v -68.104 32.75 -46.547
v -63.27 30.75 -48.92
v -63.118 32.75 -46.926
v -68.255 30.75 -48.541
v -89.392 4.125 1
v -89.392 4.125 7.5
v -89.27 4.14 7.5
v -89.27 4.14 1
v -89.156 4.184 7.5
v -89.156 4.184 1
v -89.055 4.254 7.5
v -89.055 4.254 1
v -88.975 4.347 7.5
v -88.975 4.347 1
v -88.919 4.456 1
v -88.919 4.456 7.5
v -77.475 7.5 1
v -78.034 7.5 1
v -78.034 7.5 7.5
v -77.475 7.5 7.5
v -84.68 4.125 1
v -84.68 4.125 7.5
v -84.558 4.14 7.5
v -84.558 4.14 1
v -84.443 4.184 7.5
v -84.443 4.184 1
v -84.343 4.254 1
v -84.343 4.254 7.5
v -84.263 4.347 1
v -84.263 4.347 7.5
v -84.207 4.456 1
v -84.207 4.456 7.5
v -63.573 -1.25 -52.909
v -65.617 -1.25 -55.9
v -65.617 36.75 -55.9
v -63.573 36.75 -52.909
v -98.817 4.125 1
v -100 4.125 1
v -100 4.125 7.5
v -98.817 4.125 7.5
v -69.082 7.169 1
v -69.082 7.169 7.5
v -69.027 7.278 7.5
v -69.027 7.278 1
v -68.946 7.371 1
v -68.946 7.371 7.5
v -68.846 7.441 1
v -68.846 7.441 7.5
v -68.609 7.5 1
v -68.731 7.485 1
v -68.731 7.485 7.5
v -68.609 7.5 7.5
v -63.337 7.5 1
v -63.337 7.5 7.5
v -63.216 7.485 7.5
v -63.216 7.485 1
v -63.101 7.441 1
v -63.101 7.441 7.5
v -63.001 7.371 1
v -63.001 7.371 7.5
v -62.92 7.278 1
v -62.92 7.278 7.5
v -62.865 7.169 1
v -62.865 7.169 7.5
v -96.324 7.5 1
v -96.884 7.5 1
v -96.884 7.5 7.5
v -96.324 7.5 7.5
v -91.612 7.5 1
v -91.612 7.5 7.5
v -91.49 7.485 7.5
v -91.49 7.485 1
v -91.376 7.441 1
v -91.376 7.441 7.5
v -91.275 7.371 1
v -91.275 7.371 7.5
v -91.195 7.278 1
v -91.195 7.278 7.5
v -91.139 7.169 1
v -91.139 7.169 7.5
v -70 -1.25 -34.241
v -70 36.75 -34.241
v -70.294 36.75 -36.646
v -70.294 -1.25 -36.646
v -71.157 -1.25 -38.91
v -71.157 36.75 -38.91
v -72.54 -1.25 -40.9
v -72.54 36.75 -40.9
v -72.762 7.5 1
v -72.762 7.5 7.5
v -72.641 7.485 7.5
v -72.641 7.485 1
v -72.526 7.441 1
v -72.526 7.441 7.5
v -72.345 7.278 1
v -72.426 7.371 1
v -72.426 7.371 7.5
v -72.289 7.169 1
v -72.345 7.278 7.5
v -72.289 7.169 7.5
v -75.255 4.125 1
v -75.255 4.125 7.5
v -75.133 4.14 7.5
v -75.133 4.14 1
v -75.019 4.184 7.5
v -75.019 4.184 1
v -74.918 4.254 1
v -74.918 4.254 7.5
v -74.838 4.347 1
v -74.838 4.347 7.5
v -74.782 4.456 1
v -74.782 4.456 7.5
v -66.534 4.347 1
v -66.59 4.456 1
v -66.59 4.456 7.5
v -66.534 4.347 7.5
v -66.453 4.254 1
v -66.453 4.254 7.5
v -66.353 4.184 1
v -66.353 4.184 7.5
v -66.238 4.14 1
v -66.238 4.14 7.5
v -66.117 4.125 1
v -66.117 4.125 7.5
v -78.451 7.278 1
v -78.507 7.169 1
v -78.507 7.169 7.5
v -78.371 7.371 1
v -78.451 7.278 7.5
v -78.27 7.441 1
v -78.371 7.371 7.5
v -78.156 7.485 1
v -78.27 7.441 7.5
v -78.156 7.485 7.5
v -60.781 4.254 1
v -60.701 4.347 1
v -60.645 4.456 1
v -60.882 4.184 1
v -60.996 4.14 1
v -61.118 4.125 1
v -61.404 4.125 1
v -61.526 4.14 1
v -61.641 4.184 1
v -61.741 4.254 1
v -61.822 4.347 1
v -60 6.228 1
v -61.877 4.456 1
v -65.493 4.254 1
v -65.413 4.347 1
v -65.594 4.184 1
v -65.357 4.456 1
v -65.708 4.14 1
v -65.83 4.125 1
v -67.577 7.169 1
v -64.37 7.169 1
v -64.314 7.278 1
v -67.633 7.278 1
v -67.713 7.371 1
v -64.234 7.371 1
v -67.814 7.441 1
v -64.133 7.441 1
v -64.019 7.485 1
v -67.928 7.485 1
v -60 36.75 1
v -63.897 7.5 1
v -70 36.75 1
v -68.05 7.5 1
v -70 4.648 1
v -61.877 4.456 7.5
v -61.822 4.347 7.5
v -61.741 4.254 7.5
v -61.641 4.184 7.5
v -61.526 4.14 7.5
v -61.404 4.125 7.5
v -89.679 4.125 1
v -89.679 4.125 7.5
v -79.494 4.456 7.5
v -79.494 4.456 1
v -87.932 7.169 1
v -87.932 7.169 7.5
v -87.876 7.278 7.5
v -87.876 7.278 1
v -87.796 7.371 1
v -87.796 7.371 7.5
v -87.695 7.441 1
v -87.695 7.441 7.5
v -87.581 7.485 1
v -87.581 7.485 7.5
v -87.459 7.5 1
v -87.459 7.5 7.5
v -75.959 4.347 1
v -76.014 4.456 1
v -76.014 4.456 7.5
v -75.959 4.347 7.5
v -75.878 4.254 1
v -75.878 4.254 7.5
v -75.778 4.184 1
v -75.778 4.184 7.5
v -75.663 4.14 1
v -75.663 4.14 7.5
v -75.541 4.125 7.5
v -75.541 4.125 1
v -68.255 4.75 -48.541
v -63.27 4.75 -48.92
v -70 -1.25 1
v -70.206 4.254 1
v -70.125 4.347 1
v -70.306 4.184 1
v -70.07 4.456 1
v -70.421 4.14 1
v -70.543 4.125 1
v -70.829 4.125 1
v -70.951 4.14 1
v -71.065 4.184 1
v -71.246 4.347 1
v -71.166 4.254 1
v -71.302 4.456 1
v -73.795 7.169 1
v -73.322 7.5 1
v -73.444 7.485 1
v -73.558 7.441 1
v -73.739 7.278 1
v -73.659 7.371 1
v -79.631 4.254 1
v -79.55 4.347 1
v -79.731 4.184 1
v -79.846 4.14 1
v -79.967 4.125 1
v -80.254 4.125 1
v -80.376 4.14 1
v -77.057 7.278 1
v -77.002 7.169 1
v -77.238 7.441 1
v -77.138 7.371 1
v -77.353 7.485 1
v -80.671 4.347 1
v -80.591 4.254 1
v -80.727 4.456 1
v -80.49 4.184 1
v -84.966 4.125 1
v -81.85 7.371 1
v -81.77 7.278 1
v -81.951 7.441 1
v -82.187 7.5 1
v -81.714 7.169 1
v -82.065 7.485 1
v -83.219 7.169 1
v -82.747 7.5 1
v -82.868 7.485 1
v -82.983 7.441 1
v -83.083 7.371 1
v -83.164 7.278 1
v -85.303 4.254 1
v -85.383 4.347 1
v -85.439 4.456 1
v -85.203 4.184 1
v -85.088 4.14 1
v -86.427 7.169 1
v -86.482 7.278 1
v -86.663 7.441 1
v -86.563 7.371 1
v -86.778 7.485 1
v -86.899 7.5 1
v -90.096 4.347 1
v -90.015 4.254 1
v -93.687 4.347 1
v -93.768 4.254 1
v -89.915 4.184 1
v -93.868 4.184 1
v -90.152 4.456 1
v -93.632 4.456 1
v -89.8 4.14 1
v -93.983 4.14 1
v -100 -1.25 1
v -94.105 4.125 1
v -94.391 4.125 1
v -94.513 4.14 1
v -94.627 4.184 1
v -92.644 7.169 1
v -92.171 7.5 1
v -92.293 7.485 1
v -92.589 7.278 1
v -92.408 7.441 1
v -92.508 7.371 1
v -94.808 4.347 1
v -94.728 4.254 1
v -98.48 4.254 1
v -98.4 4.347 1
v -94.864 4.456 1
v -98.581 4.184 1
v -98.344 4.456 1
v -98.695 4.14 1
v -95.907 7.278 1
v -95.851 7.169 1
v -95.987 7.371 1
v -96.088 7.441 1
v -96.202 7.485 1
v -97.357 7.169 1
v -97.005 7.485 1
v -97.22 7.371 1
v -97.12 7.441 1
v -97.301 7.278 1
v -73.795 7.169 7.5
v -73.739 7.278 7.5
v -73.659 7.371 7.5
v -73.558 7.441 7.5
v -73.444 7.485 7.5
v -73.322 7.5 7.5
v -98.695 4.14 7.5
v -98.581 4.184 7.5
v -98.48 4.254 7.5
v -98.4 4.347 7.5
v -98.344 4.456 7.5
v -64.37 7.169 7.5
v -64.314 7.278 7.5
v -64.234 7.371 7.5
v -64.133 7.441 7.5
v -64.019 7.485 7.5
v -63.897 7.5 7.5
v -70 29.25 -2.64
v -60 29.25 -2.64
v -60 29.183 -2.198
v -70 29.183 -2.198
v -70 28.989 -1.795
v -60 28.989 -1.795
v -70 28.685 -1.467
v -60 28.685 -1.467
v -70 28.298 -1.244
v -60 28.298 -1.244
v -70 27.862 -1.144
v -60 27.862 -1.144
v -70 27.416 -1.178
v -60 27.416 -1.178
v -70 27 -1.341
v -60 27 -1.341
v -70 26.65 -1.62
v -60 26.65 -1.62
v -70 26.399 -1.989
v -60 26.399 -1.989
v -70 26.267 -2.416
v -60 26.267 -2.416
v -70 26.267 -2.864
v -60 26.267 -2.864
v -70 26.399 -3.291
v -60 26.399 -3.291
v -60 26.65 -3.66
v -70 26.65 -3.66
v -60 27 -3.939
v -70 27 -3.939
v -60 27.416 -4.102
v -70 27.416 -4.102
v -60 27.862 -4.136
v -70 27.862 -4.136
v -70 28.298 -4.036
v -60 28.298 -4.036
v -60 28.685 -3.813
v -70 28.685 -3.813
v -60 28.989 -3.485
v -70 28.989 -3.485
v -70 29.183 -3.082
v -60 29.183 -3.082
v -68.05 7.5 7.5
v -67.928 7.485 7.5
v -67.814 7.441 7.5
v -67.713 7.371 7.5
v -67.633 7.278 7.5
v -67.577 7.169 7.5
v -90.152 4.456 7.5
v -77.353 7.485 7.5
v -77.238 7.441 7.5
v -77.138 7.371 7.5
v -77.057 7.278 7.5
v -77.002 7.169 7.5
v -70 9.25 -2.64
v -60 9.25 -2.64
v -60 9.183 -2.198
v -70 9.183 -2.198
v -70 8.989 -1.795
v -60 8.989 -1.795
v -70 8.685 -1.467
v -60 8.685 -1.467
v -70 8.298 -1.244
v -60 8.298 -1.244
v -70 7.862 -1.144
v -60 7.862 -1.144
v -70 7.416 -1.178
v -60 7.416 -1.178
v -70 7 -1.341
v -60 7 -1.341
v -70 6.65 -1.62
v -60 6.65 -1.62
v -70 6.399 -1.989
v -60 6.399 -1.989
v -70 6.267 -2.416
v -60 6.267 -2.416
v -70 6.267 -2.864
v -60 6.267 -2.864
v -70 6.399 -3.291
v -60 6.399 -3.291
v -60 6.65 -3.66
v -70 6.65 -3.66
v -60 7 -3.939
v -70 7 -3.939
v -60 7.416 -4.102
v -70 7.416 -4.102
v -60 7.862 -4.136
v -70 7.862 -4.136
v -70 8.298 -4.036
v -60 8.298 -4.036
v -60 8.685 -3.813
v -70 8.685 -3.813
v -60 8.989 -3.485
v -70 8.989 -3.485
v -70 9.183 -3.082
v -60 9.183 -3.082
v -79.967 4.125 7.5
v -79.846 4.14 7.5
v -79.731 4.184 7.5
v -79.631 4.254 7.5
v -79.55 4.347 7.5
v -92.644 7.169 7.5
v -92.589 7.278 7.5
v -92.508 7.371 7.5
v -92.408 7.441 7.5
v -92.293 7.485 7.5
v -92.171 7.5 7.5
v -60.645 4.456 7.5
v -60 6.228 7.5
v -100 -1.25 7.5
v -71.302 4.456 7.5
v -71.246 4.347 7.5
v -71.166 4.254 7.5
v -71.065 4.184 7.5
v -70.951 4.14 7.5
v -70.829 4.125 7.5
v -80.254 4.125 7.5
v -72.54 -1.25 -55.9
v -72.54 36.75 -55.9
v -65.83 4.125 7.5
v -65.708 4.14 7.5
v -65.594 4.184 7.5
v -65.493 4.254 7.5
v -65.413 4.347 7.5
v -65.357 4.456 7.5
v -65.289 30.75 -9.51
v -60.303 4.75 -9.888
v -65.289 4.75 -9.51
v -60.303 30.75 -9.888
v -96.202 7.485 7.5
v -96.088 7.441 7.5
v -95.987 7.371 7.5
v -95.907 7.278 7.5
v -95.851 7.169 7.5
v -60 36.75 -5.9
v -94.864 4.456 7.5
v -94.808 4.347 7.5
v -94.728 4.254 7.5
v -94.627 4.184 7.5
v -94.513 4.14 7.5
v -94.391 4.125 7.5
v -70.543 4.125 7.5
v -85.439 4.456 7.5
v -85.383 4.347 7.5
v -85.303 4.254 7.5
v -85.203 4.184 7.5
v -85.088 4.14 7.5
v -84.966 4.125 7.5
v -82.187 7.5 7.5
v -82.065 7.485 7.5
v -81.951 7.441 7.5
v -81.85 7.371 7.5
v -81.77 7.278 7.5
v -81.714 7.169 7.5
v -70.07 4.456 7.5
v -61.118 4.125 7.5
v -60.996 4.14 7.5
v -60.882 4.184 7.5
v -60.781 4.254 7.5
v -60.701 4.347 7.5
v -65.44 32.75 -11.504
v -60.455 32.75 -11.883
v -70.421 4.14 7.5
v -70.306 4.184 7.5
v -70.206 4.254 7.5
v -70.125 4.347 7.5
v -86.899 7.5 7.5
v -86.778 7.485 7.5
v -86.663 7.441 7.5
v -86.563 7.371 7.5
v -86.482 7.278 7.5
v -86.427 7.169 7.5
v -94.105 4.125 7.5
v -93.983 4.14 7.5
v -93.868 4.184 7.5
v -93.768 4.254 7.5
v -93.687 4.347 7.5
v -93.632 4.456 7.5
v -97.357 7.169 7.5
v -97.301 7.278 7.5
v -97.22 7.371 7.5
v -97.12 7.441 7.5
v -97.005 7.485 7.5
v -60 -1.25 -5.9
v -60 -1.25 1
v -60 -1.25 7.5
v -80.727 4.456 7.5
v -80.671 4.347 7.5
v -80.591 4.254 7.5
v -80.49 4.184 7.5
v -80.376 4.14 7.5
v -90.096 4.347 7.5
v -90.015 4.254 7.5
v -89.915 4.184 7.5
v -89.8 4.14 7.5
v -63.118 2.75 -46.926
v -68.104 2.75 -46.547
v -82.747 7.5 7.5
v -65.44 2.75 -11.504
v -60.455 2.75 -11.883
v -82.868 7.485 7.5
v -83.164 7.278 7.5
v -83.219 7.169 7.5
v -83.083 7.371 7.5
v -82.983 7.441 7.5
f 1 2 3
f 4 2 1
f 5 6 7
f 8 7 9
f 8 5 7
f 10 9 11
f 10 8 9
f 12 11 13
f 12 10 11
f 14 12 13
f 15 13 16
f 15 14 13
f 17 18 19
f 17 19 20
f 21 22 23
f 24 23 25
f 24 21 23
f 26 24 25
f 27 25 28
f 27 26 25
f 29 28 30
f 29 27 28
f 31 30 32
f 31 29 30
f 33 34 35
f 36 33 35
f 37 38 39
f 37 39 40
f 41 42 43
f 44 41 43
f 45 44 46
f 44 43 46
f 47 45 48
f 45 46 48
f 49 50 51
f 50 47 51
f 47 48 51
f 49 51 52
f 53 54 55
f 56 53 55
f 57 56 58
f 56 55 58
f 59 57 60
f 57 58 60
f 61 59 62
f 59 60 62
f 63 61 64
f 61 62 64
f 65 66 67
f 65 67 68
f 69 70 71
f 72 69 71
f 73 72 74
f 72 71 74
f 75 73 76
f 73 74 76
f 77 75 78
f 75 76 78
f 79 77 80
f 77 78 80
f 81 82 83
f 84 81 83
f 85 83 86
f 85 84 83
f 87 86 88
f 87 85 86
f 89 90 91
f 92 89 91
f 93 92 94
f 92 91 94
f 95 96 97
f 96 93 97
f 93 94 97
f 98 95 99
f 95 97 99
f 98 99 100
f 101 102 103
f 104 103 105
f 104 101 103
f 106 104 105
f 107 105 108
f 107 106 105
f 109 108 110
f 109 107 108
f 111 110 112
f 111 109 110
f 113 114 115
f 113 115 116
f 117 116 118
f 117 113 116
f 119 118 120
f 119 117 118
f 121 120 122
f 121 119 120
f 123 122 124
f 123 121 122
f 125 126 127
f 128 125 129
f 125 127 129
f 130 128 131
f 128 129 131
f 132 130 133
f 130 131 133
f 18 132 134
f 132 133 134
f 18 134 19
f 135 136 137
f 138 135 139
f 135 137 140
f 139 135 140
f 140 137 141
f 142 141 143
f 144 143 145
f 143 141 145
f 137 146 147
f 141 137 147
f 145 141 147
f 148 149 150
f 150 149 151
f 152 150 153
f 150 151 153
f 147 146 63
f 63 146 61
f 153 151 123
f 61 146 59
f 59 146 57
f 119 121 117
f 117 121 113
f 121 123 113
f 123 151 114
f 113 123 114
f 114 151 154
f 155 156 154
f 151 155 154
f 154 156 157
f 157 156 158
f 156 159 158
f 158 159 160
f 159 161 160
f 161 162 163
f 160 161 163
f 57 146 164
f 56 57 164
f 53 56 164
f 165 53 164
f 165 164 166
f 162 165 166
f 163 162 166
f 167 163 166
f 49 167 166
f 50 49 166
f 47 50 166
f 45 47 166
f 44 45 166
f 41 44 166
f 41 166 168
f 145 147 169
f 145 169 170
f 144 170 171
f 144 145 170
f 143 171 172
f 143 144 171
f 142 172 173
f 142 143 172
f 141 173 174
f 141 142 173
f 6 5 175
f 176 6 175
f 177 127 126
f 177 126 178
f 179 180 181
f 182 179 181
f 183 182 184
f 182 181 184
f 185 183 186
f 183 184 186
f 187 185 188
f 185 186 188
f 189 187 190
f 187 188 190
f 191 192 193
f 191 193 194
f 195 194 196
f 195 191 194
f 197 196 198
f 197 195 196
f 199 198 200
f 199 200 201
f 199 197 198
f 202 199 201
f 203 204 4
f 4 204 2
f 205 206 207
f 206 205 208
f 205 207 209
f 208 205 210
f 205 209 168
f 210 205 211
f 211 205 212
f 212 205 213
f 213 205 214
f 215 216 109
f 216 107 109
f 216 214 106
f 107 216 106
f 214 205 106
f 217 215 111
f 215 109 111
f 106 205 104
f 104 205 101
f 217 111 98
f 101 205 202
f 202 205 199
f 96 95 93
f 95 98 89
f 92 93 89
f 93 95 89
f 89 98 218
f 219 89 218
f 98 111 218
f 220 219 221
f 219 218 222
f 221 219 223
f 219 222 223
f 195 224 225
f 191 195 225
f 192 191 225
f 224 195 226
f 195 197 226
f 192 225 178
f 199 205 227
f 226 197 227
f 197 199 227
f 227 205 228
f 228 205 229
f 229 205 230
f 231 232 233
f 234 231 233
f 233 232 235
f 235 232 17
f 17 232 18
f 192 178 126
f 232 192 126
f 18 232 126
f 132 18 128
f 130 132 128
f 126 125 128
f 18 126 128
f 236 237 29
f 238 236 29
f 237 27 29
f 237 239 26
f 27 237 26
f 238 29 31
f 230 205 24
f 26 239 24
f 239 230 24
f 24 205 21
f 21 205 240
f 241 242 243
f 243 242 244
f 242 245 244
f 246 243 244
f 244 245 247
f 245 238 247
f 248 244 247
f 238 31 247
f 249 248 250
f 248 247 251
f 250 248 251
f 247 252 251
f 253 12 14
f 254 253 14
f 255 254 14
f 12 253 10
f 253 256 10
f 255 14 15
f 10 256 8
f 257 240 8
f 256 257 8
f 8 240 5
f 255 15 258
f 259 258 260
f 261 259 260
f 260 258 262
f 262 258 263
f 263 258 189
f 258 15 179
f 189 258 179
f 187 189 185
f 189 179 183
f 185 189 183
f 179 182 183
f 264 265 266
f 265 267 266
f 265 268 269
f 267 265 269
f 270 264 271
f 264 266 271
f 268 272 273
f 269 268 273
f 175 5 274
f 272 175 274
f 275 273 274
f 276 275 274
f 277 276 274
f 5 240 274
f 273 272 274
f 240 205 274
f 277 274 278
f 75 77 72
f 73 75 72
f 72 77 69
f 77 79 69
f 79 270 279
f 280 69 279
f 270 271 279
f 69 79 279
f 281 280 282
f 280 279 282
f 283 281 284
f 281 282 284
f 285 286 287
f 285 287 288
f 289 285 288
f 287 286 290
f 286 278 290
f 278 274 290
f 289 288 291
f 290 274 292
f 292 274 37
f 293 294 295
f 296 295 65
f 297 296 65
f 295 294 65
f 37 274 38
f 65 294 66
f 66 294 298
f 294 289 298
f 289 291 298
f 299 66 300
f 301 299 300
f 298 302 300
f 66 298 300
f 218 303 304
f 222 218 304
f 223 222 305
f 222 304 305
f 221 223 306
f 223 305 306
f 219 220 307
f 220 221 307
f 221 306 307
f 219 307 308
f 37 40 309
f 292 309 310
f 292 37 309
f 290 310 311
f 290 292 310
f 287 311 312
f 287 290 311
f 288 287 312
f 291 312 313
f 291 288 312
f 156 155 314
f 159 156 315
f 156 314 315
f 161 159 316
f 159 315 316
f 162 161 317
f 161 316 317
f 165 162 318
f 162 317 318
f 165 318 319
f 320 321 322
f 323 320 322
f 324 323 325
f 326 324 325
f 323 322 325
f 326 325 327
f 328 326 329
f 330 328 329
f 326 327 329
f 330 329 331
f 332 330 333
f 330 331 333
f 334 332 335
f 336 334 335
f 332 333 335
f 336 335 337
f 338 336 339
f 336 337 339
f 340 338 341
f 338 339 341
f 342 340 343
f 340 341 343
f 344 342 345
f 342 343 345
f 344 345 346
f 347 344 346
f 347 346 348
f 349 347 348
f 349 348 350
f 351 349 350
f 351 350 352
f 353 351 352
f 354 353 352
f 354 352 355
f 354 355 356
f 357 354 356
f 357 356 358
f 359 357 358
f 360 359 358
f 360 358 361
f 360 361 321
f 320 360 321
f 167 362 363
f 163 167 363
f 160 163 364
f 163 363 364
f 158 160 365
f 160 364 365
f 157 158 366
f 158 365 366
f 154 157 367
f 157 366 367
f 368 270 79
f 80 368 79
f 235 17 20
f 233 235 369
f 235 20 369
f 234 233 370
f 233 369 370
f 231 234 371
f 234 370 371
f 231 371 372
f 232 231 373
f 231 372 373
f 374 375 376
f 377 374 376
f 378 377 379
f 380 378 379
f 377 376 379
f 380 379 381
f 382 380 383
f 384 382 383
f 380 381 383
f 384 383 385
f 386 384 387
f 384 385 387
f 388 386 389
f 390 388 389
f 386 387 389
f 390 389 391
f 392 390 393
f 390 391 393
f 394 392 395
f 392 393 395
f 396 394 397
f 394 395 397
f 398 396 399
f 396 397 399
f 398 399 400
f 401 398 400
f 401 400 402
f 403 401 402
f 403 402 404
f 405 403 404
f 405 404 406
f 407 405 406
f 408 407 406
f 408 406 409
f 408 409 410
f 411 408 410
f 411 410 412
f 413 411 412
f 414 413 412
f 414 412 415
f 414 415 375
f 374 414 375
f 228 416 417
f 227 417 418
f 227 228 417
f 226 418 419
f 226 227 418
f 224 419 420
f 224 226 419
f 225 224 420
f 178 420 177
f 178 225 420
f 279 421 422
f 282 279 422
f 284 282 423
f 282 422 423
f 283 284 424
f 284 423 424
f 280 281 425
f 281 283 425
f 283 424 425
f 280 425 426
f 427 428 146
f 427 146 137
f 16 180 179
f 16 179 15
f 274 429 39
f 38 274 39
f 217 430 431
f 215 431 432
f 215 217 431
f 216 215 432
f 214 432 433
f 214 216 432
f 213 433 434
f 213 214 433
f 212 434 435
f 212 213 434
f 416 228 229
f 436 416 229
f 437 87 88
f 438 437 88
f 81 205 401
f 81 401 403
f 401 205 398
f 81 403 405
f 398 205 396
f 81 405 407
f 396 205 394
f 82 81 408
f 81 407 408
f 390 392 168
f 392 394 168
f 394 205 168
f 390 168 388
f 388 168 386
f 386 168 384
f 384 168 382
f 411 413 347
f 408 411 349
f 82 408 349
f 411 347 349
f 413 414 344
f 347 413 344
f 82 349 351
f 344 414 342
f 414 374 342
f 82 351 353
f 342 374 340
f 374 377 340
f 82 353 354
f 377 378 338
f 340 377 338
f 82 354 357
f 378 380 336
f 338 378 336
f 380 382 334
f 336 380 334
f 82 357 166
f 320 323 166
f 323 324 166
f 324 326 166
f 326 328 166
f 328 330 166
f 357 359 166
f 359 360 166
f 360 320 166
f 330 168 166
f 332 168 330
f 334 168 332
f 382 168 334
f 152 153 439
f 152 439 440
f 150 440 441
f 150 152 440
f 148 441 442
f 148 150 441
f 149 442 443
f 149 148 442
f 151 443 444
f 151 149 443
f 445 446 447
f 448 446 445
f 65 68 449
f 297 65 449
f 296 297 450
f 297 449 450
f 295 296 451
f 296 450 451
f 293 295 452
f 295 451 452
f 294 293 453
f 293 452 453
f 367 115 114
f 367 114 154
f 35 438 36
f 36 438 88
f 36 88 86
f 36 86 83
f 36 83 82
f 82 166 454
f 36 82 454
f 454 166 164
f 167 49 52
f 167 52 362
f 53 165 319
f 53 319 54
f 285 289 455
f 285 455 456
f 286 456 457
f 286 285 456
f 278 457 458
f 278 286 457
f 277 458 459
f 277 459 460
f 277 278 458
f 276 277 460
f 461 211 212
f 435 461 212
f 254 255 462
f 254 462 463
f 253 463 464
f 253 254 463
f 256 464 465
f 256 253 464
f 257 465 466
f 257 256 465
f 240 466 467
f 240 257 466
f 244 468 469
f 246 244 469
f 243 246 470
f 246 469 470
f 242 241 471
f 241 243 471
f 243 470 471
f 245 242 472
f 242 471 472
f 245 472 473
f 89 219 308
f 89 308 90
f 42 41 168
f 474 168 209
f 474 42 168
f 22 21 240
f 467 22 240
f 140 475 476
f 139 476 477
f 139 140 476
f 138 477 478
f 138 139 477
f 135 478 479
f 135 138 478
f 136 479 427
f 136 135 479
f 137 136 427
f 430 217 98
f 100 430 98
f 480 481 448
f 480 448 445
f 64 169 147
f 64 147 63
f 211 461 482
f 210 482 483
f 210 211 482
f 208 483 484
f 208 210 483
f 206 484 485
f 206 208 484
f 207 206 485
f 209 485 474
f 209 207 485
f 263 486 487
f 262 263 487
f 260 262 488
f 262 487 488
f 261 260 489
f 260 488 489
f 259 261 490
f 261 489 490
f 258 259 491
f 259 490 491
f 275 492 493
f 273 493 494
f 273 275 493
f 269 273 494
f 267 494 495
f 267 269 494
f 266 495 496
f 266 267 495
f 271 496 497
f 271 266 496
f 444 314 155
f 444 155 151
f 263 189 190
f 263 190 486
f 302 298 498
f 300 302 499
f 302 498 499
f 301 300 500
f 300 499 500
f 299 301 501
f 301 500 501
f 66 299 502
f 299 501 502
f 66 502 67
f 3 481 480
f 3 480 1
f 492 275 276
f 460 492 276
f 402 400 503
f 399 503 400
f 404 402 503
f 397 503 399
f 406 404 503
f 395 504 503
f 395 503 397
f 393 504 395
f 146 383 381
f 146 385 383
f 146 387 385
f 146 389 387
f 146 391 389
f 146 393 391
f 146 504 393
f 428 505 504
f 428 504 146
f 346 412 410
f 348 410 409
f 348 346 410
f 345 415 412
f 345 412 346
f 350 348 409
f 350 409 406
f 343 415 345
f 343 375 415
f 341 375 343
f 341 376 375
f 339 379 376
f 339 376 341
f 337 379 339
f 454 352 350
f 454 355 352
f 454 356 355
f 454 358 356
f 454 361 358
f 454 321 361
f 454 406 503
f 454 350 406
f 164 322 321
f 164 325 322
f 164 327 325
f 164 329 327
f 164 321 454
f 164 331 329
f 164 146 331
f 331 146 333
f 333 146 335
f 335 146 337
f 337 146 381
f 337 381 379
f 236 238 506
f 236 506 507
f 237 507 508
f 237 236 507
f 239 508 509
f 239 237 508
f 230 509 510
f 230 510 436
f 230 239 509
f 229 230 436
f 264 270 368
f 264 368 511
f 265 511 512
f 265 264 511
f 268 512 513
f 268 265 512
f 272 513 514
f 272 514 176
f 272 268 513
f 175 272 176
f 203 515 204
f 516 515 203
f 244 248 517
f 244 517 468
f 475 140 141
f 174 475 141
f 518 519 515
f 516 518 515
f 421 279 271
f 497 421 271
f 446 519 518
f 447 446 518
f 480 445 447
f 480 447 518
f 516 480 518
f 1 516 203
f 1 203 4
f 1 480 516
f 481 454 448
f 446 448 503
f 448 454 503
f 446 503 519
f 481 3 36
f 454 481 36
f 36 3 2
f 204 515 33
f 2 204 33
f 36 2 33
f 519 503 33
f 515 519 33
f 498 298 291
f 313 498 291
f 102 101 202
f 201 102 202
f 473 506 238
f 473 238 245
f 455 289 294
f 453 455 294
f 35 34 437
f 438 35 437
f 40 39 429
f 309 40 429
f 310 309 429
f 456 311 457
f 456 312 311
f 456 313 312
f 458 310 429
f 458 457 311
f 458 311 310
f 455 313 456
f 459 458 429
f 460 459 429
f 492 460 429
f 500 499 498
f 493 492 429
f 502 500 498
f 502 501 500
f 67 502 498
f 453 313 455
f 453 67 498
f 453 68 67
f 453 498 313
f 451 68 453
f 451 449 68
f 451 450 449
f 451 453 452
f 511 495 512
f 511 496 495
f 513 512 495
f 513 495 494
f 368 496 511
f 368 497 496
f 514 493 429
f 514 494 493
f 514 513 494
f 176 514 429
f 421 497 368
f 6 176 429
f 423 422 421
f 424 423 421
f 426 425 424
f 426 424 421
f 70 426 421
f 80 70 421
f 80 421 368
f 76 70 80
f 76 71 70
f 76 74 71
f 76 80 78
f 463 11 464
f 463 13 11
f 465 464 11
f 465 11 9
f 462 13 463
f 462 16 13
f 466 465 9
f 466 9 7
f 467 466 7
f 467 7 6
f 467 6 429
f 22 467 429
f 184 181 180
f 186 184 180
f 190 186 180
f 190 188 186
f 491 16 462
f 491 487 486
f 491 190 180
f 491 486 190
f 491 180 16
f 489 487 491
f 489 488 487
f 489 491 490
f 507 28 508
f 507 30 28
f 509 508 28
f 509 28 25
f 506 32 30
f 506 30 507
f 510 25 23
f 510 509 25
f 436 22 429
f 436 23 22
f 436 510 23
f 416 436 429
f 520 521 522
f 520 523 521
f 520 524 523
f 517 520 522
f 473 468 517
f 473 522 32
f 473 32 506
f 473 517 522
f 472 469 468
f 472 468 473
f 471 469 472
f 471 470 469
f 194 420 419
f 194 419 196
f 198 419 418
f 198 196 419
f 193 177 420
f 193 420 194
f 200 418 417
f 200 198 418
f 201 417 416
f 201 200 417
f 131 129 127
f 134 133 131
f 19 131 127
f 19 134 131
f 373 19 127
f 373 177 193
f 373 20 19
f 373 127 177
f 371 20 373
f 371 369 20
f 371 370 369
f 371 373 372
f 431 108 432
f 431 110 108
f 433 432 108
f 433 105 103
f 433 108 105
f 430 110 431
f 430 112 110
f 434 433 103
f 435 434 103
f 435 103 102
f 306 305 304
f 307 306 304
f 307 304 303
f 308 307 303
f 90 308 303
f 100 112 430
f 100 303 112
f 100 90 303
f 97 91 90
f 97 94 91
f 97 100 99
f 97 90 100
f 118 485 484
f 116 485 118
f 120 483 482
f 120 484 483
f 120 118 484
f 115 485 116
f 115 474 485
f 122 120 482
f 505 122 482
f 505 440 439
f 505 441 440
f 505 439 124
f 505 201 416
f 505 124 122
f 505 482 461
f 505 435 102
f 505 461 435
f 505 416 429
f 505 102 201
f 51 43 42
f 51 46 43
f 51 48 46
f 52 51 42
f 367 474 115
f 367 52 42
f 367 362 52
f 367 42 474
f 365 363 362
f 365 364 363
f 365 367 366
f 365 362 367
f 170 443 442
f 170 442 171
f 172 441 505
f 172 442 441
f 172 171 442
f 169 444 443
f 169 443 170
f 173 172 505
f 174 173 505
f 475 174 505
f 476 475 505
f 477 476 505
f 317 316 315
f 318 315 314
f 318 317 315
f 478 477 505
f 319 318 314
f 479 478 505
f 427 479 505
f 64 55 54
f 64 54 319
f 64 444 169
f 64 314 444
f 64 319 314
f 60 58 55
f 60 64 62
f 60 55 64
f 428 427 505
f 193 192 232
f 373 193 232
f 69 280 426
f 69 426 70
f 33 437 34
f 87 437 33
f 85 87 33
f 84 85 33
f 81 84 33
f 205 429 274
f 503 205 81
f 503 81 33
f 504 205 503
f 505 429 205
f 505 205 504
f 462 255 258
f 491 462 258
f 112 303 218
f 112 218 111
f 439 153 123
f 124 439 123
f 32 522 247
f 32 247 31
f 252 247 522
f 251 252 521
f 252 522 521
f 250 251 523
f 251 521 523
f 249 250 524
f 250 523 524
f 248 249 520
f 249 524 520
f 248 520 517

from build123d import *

# Parameters (mm, degrees)
BOSS_EXTRUDE1_DEPTH      = 7.5
BOSS_EXTRUDE1_DEPTH_BACK = 7.5
SKETCH3_W                = 200
SKETCH3_H                = 15
CUT_EXTRUDE1_DEPTH       = 101.560926806
FILLET1_R                = 0.503257554
LPATTERN1_COUNT          = 42
LPATTERN1_PITCH          = 4.71238898
FILLET1_OF_LPATTERN1_R   = 0.503257554
CUT_EXTRUDE2_DEPTH       = 101.560926806
CUT_EXTRUDE2_DEPTH_BACK  = 101.560926806
SKETCH5_W                = 4.71238898
SKETCH5_H                = 3.375
CUT_EXTRUDE3_DEPTH       = 101.560926806
CUT_EXTRUDE3_DEPTH_BACK  = 101.560926806
SKETCH6_W                = 13.890612777
SKETCH6_H                = 21.950597968
CUT_EXTRUDE6_DEPTH       = 101.560926806
CUT_EXTRUDE6_DEPTH_BACK  = 101.560926806
SKETCH8_W                = 175.100830171
SKETCH8_H                = 44.946806771
SKETCH9_W                = 55.501850732
SKETCH9_H                = 10.784038355
CUT_EXTRUDE7_DEPTH       = 101.560926806
SKETCH10_W               = 10
SKETCH10_H               = 38
BOSS_EXTRUDE2_DEPTH      = 6.9
SKETCH11_W               = 12.54
SKETCH11_H               = 38
BOSS_EXTRUDE3_DEPTH      = 50
SKETCH12_W               = 2.54
SKETCH12_H               = 35
CUT_EXTRUDE8_DEPTH       = 121.701325593
CHAMFER1_SIZE            = 3
CHAMFER1_SIZE2           = 1.816762814
FILLET2_R                = 10
SKETCH13_W               = 39.144192087
SKETCH13_H               = 30
CUT_EXTRUDE9_DEPTH       = 5
CHAMFER2_SIZE            = 2
SKETCH14_R               = 1.5
CUT_EXTRUDE10_DEPTH      = 78.944675893


with BuildPart() as part:
    # Sketch3 → Boss-Extrude1 (new, two sides: drawn at the far end of the back side and taken through both)
    with BuildSketch(Plane.XY.offset(-BOSS_EXTRUDE1_DEPTH_BACK)):
        Rectangle(SKETCH3_W, SKETCH3_H)
    extrude(amount=BOSS_EXTRUDE1_DEPTH + BOSS_EXTRUDE1_DEPTH_BACK)

    # Sketch4 → Cut-Extrude1 (cut, symmetric)
    with BuildSketch(Plane.XY):
        Polygon((-94.247779608, 7.5), (-94.247779608, 4.125), (-94.743432664, 4.125), (-95.971832204, 7.5), align=None)
        Polygon((-97.236115992, 7.5), (-98.464515532, 4.125), (-98.960168588, 4.125), (-98.960168588, 7.5), align=None)
    cut_extrude1 = extrude(amount=CUT_EXTRUDE1_DEPTH, both=True, mode=Mode.SUBTRACT)

    # Fillet1
    fillet1_edges = [part.edges().sort_by_distance(p)[0] for p in [
        (-95.971832204, 7.5, 0),
        (-94.743432664, 4.125, 0),
        (-97.236115992, 7.5, 0),
        (-98.464515532, 4.125, 0),
    ]]
    fillet(fillet1_edges, radius=FILLET1_R)

    # LPattern1: Cut-Extrude1 ×42
    with Locations(*[(i * LPATTERN1_PITCH, 0, 0) for i in range(1, LPATTERN1_COUNT)]):
        add(cut_extrude1, mode=Mode.SUBTRACT)

    # Fillet1 of LPattern1
    fillet1_of_lpattern1_edges = [part.edges().sort_by_distance(p)[0] for p in [
        (-91.259443224, 7.5, 0),
        (-90.031043683, 4.125, 0),
        (-92.523727011, 7.5, 0),
        (-93.752126552, 4.125, 0),
        (-86.547054243, 7.5, 0),
        (-85.318654703, 4.125, 0),
        (-87.811338031, 7.5, 0),
        (-89.039737571, 4.125, 0),
        (-81.834665263, 7.5, 0),
        (-80.606265722, 4.125, 0),
        (-83.09894905, 7.5, 0),
        (-84.327348591, 4.125, 0),
        (-77.122276283, 7.5, 0),
        (-75.893876742, 4.125, 0),
        (-78.38656007, 7.5, 0),
        (-79.614959611, 4.125, 0),
        (-72.409887302, 7.5, 0),
        (-71.181487762, 4.125, 0),
        (-73.67417109, 7.5, 0),
        (-74.90257063, 4.125, 0),
        (-67.697498322, 7.5, 0),
        (-66.469098781, 4.125, 0),
        (-68.961782109, 7.5, 0),
        (-70.19018165, 4.125, 0),
        (-62.985109342, 7.5, 0),
        (-61.756709801, 4.125, 0),
        (-64.249393129, 7.5, 0),
        (-65.47779267, 4.125, 0),
        (-58.272720361, 7.5, 0),
        (-57.04432082, 4.125, 0),
        (-59.537004149, 7.5, 0),
        (-60.765403689, 4.125, 0),
        (-53.560331381, 7.5, 0),
        (-52.33193184, 4.125, 0),
        (-54.824615168, 7.5, 0),
        (-56.053014709, 4.125, 0),
        (-48.8479424, 7.5, 0),
        (-47.61954286, 4.125, 0),
        (-50.112226188, 7.5, 0),
        (-51.340625728, 4.125, 0),
        (-44.13555342, 7.5, 0),
        (-42.907153879, 4.125, 0),
        (-45.399837207, 7.5, 0),
        (-46.628236748, 4.125, 0),
        (-39.42316444, 7.5, 0),
        (-38.194764899, 4.125, 0),
        (-40.687448227, 7.5, 0),
        (-41.915847768, 4.125, 0),
        (-34.710775459, 7.5, 0),
        (-33.482375919, 4.125, 0),
        (-35.975059247, 7.5, 0),
        (-37.203458787, 4.125, 0),
        (-29.998386479, 7.5, 0),
        (-28.769986938, 4.125, 0),
        (-31.262670266, 7.5, 0),
        (-32.491069807, 4.125, 0),
        (-25.285997498, 7.5, 0),
        (-24.057597958, 4.125, 0),
        (-26.550281286, 7.5, 0),
        (-27.778680826, 4.125, 0),
        (-20.573608518, 7.5, 0),
        (-19.345208977, 4.125, 0),
        (-21.837892305, 7.5, 0),
        (-23.066291846, 4.125, 0),
        (-15.861219538, 7.5, 0),
        (-14.632819997, 4.125, 0),
        (-17.125503325, 7.5, 0),
        (-18.353902866, 4.125, 0),
        (-11.148830557, 7.5, 0),
        (-9.920431017, 4.125, 0),
        (-12.413114345, 7.5, 0),
        (-13.641513885, 4.125, 0),
        (-6.436441577, 7.5, 0),
        (-5.208042036, 4.125, 0),
        (-7.700725364, 7.5, 0),
        (-8.929124905, 4.125, 0),
        (-1.724052597, 7.5, 0),
        (-0.495653056, 4.125, 0),
        (-2.988336384, 7.5, 0),
        (-4.216735925, 4.125, 0),
        (2.988336384, 7.5, 0),
        (4.216735925, 4.125, 0),
        (1.724052596, 7.5, 0),
        (0.495653056, 4.125, 0),
        (7.700725364, 7.5, 0),
        (8.929124905, 4.125, 0),
        (6.436441577, 7.5, 0),
        (5.208042036, 4.125, 0),
        (12.413114345, 7.5, 0),
        (13.641513885, 4.125, 0),
        (11.148830557, 7.5, 0),
        (9.920431017, 4.125, 0),
        (17.125503325, 7.5, 0),
        (18.353902866, 4.125, 0),
        (15.861219538, 7.5, 0),
        (14.632819997, 4.125, 0),
        (21.837892305, 7.5, 0),
        (23.066291846, 4.125, 0),
        (20.573608518, 7.5, 0),
        (19.345208977, 4.125, 0),
        (26.550281286, 7.5, 0),
        (27.778680826, 4.125, 0),
        (25.285997498, 7.5, 0),
        (24.057597958, 4.125, 0),
        (31.262670266, 7.5, 0),
        (32.491069807, 4.125, 0),
        (29.998386479, 7.5, 0),
        (28.769986938, 4.125, 0),
        (35.975059247, 7.5, 0),
        (37.203458787, 4.125, 0),
        (34.710775459, 7.5, 0),
        (33.482375919, 4.125, 0),
        (40.687448227, 7.5, 0),
        (41.915847768, 4.125, 0),
        (39.42316444, 7.5, 0),
        (38.194764899, 4.125, 0),
        (45.399837207, 7.5, 0),
        (46.628236748, 4.125, 0),
        (44.13555342, 7.5, 0),
        (42.907153879, 4.125, 0),
        (50.112226188, 7.5, 0),
        (51.340625728, 4.125, 0),
        (48.8479424, 7.5, 0),
        (47.61954286, 4.125, 0),
        (54.824615168, 7.5, 0),
        (56.053014709, 4.125, 0),
        (53.560331381, 7.5, 0),
        (52.33193184, 4.125, 0),
        (59.537004148, 7.5, 0),
        (60.765403689, 4.125, 0),
        (58.272720361, 7.5, 0),
        (57.04432082, 4.125, 0),
        (64.249393129, 7.5, 0),
        (65.47779267, 4.125, 0),
        (62.985109341, 7.5, 0),
        (61.756709801, 4.125, 0),
        (68.961782109, 7.5, 0),
        (70.19018165, 4.125, 0),
        (67.697498322, 7.5, 0),
        (66.469098781, 4.125, 0),
        (73.67417109, 7.5, 0),
        (74.90257063, 4.125, 0),
        (72.409887302, 7.5, 0),
        (71.181487762, 4.125, 0),
        (78.38656007, 7.5, 0),
        (79.614959611, 4.125, 0),
        (77.122276283, 7.5, 0),
        (75.893876742, 4.125, 0),
        (83.09894905, 7.5, 0),
        (84.327348591, 4.125, 0),
        (81.834665263, 7.5, 0),
        (80.606265722, 4.125, 0),
        (87.811338031, 7.5, 0),
        (89.039737571, 4.125, 0),
        (86.547054243, 7.5, 0),
        (85.318654703, 4.125, 0),
        (92.523727011, 7.5, 0),
        (93.752126552, 4.125, 0),
        (91.259443224, 7.5, 0),
        (90.031043683, 4.125, 0),
        (97.236115992, 7.5, 0),
        (98.464515532, 4.125, 0),
        (95.971832204, 7.5, 0),
        (94.743432664, 4.125, 0),
    ]]
    fillet(fillet1_of_lpattern1_edges, radius=FILLET1_OF_LPATTERN1_R)

    # Sketch5 → Cut-Extrude2 (cut, two sides: drawn at the far end of the back side and taken through both)
    with BuildSketch(Plane.XY.offset(-CUT_EXTRUDE2_DEPTH_BACK)):
        with Locations((-101.316363078, 5.8125)):
            Rectangle(SKETCH5_W, SKETCH5_H)
        with Locations((101.316363078, 5.8125)):
            Rectangle(SKETCH5_W, SKETCH5_H)
    extrude(amount=CUT_EXTRUDE2_DEPTH + CUT_EXTRUDE2_DEPTH_BACK, mode=Mode.SUBTRACT)

    # Sketch6 → Cut-Extrude3 (cut, two sides: drawn at the far end of the back side and taken through both)
    with BuildSketch(Plane(origin=(0, 0, 0), x_dir=(0, 0, -1), z_dir=(1, 0, 0)).offset(-CUT_EXTRUDE3_DEPTH_BACK)):
        with Locations((5.945306389, -0.750264579)):
            Rectangle(SKETCH6_W, SKETCH6_H)
    extrude(amount=CUT_EXTRUDE3_DEPTH + CUT_EXTRUDE3_DEPTH_BACK, mode=Mode.SUBTRACT)

    # Sketch8 → Cut-Extrude6 (cut, two sides: drawn at the far end of the back side and taken through both)
    with BuildSketch(Plane.XY.offset(-CUT_EXTRUDE6_DEPTH_BACK)):
        with Locations((27.550415086, 7.242613414)):
            Rectangle(SKETCH8_W, SKETCH8_H)
    extrude(amount=CUT_EXTRUDE6_DEPTH + CUT_EXTRUDE6_DEPTH_BACK, mode=Mode.SUBTRACT)

    # Sketch9 → Cut-Extrude7 (cut, through all)
    with BuildSketch(Plane.XY):
        with Locations((-76.828993169, -6.642019178)):
            Rectangle(SKETCH9_W, SKETCH9_H)
    extrude(amount=CUT_EXTRUDE7_DEPTH, mode=Mode.SUBTRACT)

    # Sketch10 → Boss-Extrude2 (add)
    with BuildSketch(Plane(origin=(0, 0, 1), x_dir=(-1, 0, 0), z_dir=(0, 0, -1))):
        with Locations((65, 17.75)):
            Rectangle(SKETCH10_W, SKETCH10_H)
    extrude(amount=BOSS_EXTRUDE2_DEPTH)

    # Sketch11 → Boss-Extrude3 (add)
    with BuildSketch(Plane(origin=(0, 0, -5.9), x_dir=(-1, 0, 0), z_dir=(0, 0, -1))):
        with Locations((66.27, 17.75)):
            Rectangle(SKETCH11_W, SKETCH11_H)
    extrude(amount=BOSS_EXTRUDE3_DEPTH)

    # Sketch12 → Cut-Extrude8 (cut, through all)
    with BuildSketch(Plane.XZ.offset(1.25)):
        with Locations((-71.27, -23.4)):
            Rectangle(SKETCH12_W, SKETCH12_H)
        Polygon((-60, -5.9), (-63.8, -55.9), (-60, -55.9), align=None)
    extrude(amount=-CUT_EXTRUDE8_DEPTH, mode=Mode.SUBTRACT)

    # Chamfer1
    chamfer1_edges = [part.edges().sort_by_distance(p)[0] for p in [
        (-63.8, 17.75, -55.9),
    ]]
    chamfer1_side = [part.faces().sort_by_distance(p)[0] for p in [
        (-61.9, 17.75, -30.9),
    ]]
    chamfer(chamfer1_edges, length=CHAMFER1_SIZE, length2=CHAMFER1_SIZE2, reference=chamfer1_side[0])

    # Fillet2
    # the kernel refuses this fillet: 10 mm, written as the material it adds along each edge
    with BuildSketch(Plane(origin=(-70, -1.25, -40.9), x_dir=(-1, 0, 0), z_dir=(0, 1, 0))) as fillet2_piece_1:
        with BuildLine():
            CenterArc((10, 6.659459438), FILLET2_R, 180, 41.754936598)
            Line((0, 6.659459438), (-0.2, 6.659459438))
            Line((-0.2, 6.659459438), (-0.2, 0))
            Line((-0.2, 0), (0, -0.2))
            ThreePointArc((0, -0.2), (1.27, -0.2), (2.3908, -0.133189189))
            Line((2.3908, -0.133189189), (2.54, 0))
        make_face()
    extrude(amount=38)

    # Sketch13 → Cut-Extrude9 (cut)
    with BuildSketch(Plane(origin=(-59.20960532, 0, 4.499930004), x_dir=(-0.07578145826840343, 0, -0.997124450900044), z_dir=(0.997124450900044, 0, -0.07578145826840343))):
        with Locations((34.0020178, 17.75)):
            Rectangle(SKETCH13_W, SKETCH13_H)
    extrude(amount=-CUT_EXTRUDE9_DEPTH, mode=Mode.SUBTRACT)

    # Chamfer2
    chamfer2_edges = [part.edges().sort_by_distance(p)[0] for p in [
        (-62.79593696, 2.75, -9.699044158),
        (-62.79593696, 32.75, -9.699044158),
        (-65.762340919, 32.75, -48.730675198),
        (-65.762340919, 2.75, -48.730675198),
    ]]
    chamfer(chamfer2_edges, length=CHAMFER2_SIZE)

    # Sketch14 → Cut-Extrude10 (cut, through all)
    with BuildSketch(Plane(origin=(-60, 0, 0), x_dir=(0, 0, -1), z_dir=(1, 0, 0))):
        with Locations(Location((2.64, 27.75, 0), (0, 0, 90))):
            Circle(SKETCH14_R)
        with Locations(Location((2.64, 7.75, 0), (0, 0, 90))):
            Circle(SKETCH14_R)
    extrude(amount=-CUT_EXTRUDE10_DEPTH, mode=Mode.SUBTRACT)


solid = part.part
